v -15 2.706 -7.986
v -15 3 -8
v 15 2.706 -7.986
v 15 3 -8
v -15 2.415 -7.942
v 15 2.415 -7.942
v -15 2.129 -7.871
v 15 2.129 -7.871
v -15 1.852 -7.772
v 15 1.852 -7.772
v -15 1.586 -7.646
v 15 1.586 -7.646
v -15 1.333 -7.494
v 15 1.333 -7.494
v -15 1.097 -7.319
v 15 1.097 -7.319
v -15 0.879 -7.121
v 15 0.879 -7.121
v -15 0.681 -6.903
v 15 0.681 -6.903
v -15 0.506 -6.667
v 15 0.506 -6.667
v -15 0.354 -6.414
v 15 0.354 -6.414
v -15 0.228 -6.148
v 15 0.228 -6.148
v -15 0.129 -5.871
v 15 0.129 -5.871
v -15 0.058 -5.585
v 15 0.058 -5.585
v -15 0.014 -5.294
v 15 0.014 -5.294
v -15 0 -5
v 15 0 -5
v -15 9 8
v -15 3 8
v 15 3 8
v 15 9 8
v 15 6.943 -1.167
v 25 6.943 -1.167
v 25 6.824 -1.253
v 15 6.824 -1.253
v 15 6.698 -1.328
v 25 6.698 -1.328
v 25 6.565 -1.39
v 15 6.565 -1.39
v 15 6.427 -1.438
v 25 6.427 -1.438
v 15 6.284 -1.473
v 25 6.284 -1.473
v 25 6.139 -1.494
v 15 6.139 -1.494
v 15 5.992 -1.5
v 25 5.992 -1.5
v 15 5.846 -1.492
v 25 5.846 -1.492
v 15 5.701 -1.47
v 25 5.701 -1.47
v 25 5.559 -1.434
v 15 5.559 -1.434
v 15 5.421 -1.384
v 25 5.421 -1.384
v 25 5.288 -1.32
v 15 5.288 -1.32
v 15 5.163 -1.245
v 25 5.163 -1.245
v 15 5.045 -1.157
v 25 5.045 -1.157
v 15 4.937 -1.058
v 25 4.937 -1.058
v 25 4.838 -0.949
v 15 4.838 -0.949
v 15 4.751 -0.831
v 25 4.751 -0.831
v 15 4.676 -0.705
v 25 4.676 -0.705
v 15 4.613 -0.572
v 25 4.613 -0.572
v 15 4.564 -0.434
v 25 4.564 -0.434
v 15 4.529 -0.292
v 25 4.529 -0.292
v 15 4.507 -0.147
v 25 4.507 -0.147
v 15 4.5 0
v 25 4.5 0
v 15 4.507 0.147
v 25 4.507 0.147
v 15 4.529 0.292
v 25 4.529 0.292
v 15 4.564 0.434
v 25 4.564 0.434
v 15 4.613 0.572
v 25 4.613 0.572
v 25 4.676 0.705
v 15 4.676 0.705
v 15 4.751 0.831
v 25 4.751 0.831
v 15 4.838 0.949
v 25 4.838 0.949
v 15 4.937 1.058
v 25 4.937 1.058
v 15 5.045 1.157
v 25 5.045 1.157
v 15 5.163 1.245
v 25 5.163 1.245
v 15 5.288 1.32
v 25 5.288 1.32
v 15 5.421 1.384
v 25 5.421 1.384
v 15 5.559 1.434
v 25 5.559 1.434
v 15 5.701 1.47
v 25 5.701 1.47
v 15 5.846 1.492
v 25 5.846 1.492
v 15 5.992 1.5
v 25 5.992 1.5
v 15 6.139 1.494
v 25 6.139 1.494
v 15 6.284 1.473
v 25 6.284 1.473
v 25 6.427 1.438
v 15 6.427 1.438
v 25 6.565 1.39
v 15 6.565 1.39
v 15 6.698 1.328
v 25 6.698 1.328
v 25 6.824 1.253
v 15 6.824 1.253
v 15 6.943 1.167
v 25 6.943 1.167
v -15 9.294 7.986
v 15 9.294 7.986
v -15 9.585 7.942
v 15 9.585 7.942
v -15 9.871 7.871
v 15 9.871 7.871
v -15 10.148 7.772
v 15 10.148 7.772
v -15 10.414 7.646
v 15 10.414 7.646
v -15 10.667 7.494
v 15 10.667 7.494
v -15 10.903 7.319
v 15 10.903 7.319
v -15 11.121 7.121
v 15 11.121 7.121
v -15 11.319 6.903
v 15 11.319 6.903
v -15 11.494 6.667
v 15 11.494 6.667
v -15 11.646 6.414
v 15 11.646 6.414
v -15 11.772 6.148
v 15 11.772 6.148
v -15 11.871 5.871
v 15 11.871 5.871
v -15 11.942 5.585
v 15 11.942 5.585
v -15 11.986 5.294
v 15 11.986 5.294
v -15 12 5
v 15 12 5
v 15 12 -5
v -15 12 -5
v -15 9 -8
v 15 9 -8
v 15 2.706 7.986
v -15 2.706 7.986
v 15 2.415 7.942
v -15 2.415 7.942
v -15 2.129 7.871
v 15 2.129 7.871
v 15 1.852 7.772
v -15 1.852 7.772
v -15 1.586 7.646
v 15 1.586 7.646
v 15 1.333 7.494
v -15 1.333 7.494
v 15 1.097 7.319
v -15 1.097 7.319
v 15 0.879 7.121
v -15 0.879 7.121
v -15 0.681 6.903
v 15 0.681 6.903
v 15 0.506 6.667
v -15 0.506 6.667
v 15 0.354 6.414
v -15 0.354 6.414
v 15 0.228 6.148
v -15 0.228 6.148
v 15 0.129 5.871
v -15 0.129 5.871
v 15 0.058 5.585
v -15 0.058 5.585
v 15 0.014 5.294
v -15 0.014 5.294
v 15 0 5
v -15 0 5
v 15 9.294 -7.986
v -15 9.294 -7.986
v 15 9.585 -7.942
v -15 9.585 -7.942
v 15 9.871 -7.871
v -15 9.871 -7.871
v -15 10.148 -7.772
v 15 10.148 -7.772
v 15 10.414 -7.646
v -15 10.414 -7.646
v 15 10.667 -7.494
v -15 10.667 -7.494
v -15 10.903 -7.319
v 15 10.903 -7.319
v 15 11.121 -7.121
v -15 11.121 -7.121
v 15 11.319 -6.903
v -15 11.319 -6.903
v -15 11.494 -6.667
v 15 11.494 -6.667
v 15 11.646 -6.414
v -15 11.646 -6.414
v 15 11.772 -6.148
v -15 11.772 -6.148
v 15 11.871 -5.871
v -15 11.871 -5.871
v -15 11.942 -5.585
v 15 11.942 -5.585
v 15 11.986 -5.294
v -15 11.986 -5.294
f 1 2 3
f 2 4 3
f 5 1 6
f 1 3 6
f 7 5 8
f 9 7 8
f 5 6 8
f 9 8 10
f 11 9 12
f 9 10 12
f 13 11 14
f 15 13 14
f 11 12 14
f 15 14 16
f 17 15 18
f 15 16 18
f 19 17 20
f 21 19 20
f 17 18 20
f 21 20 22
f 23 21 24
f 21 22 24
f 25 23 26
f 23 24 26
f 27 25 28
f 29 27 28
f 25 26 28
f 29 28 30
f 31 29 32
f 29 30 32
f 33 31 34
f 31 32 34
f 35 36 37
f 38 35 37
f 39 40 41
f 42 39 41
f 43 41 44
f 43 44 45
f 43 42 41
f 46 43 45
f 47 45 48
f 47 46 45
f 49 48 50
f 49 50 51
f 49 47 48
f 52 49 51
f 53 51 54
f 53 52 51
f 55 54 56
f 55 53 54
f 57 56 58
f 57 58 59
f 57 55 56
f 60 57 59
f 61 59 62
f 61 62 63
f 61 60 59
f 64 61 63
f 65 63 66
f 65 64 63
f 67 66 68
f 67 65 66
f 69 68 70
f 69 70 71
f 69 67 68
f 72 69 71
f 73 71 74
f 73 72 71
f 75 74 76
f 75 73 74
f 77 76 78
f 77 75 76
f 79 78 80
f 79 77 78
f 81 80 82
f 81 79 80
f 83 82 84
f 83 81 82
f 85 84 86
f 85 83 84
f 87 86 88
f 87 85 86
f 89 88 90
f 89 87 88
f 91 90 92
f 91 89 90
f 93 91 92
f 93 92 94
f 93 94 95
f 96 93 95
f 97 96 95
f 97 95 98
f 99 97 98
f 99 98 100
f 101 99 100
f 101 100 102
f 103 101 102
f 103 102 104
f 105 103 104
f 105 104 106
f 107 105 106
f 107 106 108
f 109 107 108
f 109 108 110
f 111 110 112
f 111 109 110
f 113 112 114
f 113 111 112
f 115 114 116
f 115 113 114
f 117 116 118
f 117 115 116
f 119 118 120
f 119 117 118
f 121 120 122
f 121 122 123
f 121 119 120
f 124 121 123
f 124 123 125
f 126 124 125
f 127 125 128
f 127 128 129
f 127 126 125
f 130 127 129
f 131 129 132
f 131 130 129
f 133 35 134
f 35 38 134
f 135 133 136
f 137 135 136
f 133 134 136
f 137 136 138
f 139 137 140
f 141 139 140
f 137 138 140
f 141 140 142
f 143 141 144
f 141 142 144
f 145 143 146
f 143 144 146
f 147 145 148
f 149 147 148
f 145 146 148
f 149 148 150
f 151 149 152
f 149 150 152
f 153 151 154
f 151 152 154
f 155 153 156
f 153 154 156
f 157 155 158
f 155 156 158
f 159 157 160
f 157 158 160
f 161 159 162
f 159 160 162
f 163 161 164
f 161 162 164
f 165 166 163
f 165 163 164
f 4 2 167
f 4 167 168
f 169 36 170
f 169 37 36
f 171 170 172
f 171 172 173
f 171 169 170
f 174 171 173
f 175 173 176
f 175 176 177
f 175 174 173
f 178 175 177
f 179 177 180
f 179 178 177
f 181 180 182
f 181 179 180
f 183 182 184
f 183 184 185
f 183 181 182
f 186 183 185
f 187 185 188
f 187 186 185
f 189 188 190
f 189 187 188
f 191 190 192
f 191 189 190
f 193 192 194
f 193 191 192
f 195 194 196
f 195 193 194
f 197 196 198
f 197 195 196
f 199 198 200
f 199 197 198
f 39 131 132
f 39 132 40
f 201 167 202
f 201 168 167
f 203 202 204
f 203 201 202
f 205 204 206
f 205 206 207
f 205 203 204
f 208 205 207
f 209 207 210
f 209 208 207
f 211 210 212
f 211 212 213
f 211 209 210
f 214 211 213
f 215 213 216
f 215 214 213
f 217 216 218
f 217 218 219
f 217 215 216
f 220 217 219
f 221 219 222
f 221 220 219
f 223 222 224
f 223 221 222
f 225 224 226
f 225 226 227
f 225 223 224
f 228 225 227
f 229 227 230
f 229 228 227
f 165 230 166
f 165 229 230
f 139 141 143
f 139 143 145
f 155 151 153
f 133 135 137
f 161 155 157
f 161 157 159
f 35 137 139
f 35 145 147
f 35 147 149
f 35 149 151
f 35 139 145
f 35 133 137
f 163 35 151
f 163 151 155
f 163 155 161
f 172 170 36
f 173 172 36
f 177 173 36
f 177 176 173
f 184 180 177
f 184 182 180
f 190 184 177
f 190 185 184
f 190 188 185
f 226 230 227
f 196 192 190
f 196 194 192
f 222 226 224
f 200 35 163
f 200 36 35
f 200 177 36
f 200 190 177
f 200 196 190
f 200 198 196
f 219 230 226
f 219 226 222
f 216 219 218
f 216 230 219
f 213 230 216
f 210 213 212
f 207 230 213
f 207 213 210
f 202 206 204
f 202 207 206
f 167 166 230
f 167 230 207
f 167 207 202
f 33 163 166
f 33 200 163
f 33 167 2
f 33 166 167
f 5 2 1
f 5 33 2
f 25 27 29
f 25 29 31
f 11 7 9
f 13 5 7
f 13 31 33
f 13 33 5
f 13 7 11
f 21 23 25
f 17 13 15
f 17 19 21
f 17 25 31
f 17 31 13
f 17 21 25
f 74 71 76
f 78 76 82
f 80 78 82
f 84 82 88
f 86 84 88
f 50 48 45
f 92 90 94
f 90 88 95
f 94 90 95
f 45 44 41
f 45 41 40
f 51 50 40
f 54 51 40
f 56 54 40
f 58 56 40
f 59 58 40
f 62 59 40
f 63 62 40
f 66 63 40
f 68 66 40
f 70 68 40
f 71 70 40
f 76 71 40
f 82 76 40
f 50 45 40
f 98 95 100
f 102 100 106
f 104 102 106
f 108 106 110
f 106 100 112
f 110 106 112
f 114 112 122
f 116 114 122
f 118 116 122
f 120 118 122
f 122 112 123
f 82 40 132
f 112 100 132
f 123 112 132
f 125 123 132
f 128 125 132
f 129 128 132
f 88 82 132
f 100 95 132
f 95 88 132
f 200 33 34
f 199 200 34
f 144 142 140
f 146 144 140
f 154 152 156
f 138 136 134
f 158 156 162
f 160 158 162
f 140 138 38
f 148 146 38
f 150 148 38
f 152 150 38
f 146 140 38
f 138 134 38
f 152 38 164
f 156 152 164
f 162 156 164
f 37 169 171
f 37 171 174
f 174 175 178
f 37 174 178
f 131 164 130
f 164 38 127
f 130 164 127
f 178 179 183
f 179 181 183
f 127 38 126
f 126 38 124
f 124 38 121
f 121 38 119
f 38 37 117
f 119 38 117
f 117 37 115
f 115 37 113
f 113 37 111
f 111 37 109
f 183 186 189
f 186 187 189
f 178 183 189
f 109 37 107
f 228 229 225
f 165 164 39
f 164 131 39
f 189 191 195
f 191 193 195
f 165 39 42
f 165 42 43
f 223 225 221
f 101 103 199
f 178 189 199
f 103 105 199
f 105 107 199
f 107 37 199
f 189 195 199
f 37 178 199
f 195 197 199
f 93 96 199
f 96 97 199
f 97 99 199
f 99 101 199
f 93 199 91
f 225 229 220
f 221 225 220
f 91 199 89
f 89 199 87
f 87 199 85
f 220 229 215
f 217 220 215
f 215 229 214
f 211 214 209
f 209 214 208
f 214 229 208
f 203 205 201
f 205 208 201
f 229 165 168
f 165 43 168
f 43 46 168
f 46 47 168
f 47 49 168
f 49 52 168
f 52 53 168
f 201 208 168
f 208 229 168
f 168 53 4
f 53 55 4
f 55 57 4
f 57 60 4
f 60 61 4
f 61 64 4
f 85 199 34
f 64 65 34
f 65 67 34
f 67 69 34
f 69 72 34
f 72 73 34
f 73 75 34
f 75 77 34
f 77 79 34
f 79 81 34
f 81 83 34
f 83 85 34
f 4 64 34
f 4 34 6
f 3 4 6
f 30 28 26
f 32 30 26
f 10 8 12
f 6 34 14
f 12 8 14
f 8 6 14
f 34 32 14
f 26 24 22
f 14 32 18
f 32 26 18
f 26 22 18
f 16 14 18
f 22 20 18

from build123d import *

# Parameters (mm, degrees)
SKETCH1_W           = 30
SKETCH1_H           = 16
BOSS_EXTRUDE1_DEPTH = 12
FILLET2_R           = 3
BOSS_EXTRUDE3_DEPTH = 10


with BuildPart() as part:
    # Sketch1 → Boss-Extrude1 (new body)
    with BuildSketch(Plane(origin=(0, 0, 0), x_dir=(1, 0, 0), z_dir=(0, 1, 0))):
        Rectangle(SKETCH1_W, SKETCH1_H)
    extrude(amount=BOSS_EXTRUDE1_DEPTH)

    # Fillet2
    fillet2_edges = [part.edges().sort_by_distance(p)[0] for p in [
        (0, 12, 8),
        (0, 0, 8),
        (0, 0, -8),
        (0, 12, -8),
    ]]
    fillet(fillet2_edges, radius=FILLET2_R)

    # Sketch3 → Boss-Extrude3 (add)
    with BuildSketch(Plane(origin=(15, 0, 0), x_dir=(0, 0, -1), z_dir=(1, 0, 0))):
        with BuildLine():
            Line((-1.166565174, 6.942934619), (1.166565174, 6.942934619))
            ThreePointArc((1.166565174, 6.942934619), (0, 4.5), (-1.166565174, 6.942934619))
        make_face()
    extrude(amount=BOSS_EXTRUDE3_DEPTH)


solid = part.part
